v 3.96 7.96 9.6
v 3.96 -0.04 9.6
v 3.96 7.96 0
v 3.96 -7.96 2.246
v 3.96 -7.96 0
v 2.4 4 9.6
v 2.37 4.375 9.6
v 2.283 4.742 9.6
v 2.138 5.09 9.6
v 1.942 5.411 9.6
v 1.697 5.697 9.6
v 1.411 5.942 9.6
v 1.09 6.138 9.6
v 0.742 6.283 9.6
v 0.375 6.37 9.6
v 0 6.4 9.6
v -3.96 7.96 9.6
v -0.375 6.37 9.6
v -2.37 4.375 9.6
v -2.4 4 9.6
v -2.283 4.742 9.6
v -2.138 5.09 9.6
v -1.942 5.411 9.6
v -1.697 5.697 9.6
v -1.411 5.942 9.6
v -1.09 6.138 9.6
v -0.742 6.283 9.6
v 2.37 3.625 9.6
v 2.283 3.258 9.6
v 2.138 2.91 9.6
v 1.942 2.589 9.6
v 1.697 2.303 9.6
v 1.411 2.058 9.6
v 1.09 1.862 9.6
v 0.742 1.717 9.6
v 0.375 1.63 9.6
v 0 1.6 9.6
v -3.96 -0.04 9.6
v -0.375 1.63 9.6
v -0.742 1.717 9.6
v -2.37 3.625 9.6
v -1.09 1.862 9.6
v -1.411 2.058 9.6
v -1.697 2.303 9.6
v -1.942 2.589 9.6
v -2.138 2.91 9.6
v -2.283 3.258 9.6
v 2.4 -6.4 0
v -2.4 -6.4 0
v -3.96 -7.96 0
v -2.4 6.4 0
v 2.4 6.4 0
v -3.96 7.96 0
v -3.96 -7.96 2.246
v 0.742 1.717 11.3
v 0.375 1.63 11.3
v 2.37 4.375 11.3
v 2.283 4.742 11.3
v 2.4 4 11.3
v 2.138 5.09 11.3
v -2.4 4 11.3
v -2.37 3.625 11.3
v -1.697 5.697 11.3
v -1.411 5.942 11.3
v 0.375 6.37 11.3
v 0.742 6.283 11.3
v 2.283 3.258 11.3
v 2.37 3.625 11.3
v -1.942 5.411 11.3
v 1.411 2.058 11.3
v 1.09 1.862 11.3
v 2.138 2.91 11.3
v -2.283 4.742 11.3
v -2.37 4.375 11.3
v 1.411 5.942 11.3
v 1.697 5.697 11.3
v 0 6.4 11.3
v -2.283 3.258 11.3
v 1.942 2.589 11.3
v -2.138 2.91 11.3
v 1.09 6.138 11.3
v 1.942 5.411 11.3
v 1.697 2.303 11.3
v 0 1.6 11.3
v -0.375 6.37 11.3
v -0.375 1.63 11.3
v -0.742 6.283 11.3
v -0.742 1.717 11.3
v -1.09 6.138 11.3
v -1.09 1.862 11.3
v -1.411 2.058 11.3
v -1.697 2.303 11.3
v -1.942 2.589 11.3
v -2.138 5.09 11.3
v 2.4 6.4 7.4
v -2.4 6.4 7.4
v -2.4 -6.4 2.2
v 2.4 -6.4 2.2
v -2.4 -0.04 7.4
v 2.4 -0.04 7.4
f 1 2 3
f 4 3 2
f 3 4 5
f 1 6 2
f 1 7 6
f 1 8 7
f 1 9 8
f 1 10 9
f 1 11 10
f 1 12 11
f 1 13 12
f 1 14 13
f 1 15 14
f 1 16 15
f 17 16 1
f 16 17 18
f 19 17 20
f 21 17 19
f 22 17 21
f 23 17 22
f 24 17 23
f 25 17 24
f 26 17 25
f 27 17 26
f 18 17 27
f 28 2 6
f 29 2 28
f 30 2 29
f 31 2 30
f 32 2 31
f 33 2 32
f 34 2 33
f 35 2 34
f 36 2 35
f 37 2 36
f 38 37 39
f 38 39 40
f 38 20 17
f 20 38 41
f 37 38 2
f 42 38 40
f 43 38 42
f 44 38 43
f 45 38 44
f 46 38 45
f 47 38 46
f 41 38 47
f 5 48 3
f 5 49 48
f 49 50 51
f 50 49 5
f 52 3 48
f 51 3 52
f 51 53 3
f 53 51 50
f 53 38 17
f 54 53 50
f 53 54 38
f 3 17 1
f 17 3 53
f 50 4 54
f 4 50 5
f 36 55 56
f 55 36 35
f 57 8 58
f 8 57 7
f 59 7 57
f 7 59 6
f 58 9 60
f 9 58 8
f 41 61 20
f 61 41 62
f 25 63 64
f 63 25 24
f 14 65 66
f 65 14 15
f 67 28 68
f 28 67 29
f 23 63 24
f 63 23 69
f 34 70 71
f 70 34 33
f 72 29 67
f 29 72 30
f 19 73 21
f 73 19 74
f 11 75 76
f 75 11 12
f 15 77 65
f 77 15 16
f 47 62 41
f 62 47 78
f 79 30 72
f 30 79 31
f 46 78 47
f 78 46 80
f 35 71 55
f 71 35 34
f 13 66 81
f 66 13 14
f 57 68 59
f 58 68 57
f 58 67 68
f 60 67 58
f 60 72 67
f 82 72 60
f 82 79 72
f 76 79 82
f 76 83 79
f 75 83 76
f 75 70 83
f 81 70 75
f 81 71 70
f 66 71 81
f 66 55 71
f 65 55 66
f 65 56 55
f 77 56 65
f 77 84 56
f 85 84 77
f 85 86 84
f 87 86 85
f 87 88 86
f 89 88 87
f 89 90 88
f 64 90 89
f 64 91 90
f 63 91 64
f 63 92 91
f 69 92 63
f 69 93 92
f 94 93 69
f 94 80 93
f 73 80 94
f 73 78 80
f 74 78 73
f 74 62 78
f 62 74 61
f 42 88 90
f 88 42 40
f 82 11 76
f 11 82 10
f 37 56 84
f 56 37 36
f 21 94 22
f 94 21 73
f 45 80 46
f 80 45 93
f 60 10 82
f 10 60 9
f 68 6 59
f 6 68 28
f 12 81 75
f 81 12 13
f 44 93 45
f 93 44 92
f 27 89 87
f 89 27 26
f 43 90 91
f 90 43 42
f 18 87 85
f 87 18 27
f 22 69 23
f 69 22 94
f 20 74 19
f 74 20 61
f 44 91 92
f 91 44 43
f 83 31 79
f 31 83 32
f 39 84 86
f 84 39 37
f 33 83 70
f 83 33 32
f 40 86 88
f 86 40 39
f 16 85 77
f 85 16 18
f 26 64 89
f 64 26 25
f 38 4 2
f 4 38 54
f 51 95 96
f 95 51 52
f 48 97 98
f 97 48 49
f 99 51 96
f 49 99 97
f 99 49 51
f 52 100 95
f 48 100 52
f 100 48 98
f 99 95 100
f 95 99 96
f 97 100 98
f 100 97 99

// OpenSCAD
$fn=40;

eps = 0.05;
dummySize = 20;

// dimensions of brick in units
nrOfLengthUnits = 1;
nrOfWidthUnits = 2;


pitch = 8.0;
space = 0.04;
thickness = (1.6-space);
thicknessHeight = 2.3;
height = 9.6;
heightInner = 2.2;

cylinderTopRadius = 4.8 / 2;
cylinderTopHeight = 1.7;

cylinderBottomOuterRadius = 6.66 / 2;
cylinderBottomInnerRadius = 4.95 / 2;

length = nrOfLengthUnits * pitch - 2 * space;
width = nrOfWidthUnits * pitch - 2 * space;



module drawOuterCut()
{
	rotate([0,0,-90]) rotate([90,0,0]) linear_extrude(height=length+2*eps, center=true) polygon([[pitch,height],[pitch,height+dummySize],[width+eps,height+dummySize],[width+eps,heightInner],[pitch,height]]);
}


module drawInnerCut()
{
	rotate([0,0,-90]) rotate([90,0,0]) linear_extrude(height=length-2*thickness, center=true) polygon([[0,0],[width-2*thickness,0],[width-2*thickness,heightInner+eps],[pitch-thickness,height-heightInner+eps],[0, height-heightInner+eps]]);
}


// 2d primitive for outside fillets.
module fil_2d_o(r, angle=90) {
  intersection() {
    circle(r=r);
    polygon([
      [0, 0],
      [0, r],
      [r * tan(angle/2), r],
      [r * sin(angle), r * cos(angle)]
    ]);
  }
}

// 3d polar outside fillet.
module fil_polar_o(R, r, h, angle=90) {
  union(){
	  translate([0,0,h]) {
		rotate_extrude(convexity=10) {
		    translate([R-r, 0, 0]) {
		      fil_2d_o(r, angle);
		    }
		  }
	      cylinder(r=R-r+0.1, h=r);
      }
      cylinder(r=R, h=h);
  }
}

module drawExternalPin()
{
	translate([0,0,h1-eps]) 
    {
        difference()
        {
            fil_polar_o(r_pin,r_fillet,h_pin-r_fillet,angle=90);
        }
    }
    
	//translate([0,0,h1-eps]) cylinder(h_pin+eps, r_pin, r_pin);
}

module drawRoof()
{
	difference()
	{
		union()
		{	
			translate([-length/2,-width/2,0]) cube([length, width, height]);
			for (i = [1:nrOfLengthUnits])
			{
				translate([i*pitch-nrOfLengthUnits*pitch/2-pitch/2,nrOfWidthUnits*pitch/2-pitch/2,height-eps]) cylinder(r=cylinderTopRadius, h=cylinderTopHeight+eps);
			}
		}
		union()
		{	
			translate([0, width/2,0]) drawOuterCut();
			translate([0, width/2-thickness,-eps]) drawInnerCut();
		}		
	}

	difference()
	{
		union()
		{
			if (nrOfLengthUnits > 1)
			{
				for (x = [1:nrOfLengthUnits-1])
				{
					for (y = [1:nrOfWidthUnits-1])
					{
						difference() {
							translate([x*pitch-nrOfLengthUnits*pitch/2,nrOfWidthUnits*pitch/2-y*pitch,0]) cylinder(r=cylinderBottomOuterRadius, h=height-thicknessHeight+eps);
							translate([x*pitch-nrOfLengthUnits*pitch/2,nrOfWidthUnits*pitch/2-y*pitch,-eps]) cylinder(r=cylinderBottomInnerRadius, h=height-thicknessHeight+eps);
						}
					}
				}
			} 
		}
		union() 
		{
			if (nrOfLengthUnits > 1)
			{
				translate([0, width/2,0]) drawOuterCut();
			}
		}
	}
}



drawRoof();
